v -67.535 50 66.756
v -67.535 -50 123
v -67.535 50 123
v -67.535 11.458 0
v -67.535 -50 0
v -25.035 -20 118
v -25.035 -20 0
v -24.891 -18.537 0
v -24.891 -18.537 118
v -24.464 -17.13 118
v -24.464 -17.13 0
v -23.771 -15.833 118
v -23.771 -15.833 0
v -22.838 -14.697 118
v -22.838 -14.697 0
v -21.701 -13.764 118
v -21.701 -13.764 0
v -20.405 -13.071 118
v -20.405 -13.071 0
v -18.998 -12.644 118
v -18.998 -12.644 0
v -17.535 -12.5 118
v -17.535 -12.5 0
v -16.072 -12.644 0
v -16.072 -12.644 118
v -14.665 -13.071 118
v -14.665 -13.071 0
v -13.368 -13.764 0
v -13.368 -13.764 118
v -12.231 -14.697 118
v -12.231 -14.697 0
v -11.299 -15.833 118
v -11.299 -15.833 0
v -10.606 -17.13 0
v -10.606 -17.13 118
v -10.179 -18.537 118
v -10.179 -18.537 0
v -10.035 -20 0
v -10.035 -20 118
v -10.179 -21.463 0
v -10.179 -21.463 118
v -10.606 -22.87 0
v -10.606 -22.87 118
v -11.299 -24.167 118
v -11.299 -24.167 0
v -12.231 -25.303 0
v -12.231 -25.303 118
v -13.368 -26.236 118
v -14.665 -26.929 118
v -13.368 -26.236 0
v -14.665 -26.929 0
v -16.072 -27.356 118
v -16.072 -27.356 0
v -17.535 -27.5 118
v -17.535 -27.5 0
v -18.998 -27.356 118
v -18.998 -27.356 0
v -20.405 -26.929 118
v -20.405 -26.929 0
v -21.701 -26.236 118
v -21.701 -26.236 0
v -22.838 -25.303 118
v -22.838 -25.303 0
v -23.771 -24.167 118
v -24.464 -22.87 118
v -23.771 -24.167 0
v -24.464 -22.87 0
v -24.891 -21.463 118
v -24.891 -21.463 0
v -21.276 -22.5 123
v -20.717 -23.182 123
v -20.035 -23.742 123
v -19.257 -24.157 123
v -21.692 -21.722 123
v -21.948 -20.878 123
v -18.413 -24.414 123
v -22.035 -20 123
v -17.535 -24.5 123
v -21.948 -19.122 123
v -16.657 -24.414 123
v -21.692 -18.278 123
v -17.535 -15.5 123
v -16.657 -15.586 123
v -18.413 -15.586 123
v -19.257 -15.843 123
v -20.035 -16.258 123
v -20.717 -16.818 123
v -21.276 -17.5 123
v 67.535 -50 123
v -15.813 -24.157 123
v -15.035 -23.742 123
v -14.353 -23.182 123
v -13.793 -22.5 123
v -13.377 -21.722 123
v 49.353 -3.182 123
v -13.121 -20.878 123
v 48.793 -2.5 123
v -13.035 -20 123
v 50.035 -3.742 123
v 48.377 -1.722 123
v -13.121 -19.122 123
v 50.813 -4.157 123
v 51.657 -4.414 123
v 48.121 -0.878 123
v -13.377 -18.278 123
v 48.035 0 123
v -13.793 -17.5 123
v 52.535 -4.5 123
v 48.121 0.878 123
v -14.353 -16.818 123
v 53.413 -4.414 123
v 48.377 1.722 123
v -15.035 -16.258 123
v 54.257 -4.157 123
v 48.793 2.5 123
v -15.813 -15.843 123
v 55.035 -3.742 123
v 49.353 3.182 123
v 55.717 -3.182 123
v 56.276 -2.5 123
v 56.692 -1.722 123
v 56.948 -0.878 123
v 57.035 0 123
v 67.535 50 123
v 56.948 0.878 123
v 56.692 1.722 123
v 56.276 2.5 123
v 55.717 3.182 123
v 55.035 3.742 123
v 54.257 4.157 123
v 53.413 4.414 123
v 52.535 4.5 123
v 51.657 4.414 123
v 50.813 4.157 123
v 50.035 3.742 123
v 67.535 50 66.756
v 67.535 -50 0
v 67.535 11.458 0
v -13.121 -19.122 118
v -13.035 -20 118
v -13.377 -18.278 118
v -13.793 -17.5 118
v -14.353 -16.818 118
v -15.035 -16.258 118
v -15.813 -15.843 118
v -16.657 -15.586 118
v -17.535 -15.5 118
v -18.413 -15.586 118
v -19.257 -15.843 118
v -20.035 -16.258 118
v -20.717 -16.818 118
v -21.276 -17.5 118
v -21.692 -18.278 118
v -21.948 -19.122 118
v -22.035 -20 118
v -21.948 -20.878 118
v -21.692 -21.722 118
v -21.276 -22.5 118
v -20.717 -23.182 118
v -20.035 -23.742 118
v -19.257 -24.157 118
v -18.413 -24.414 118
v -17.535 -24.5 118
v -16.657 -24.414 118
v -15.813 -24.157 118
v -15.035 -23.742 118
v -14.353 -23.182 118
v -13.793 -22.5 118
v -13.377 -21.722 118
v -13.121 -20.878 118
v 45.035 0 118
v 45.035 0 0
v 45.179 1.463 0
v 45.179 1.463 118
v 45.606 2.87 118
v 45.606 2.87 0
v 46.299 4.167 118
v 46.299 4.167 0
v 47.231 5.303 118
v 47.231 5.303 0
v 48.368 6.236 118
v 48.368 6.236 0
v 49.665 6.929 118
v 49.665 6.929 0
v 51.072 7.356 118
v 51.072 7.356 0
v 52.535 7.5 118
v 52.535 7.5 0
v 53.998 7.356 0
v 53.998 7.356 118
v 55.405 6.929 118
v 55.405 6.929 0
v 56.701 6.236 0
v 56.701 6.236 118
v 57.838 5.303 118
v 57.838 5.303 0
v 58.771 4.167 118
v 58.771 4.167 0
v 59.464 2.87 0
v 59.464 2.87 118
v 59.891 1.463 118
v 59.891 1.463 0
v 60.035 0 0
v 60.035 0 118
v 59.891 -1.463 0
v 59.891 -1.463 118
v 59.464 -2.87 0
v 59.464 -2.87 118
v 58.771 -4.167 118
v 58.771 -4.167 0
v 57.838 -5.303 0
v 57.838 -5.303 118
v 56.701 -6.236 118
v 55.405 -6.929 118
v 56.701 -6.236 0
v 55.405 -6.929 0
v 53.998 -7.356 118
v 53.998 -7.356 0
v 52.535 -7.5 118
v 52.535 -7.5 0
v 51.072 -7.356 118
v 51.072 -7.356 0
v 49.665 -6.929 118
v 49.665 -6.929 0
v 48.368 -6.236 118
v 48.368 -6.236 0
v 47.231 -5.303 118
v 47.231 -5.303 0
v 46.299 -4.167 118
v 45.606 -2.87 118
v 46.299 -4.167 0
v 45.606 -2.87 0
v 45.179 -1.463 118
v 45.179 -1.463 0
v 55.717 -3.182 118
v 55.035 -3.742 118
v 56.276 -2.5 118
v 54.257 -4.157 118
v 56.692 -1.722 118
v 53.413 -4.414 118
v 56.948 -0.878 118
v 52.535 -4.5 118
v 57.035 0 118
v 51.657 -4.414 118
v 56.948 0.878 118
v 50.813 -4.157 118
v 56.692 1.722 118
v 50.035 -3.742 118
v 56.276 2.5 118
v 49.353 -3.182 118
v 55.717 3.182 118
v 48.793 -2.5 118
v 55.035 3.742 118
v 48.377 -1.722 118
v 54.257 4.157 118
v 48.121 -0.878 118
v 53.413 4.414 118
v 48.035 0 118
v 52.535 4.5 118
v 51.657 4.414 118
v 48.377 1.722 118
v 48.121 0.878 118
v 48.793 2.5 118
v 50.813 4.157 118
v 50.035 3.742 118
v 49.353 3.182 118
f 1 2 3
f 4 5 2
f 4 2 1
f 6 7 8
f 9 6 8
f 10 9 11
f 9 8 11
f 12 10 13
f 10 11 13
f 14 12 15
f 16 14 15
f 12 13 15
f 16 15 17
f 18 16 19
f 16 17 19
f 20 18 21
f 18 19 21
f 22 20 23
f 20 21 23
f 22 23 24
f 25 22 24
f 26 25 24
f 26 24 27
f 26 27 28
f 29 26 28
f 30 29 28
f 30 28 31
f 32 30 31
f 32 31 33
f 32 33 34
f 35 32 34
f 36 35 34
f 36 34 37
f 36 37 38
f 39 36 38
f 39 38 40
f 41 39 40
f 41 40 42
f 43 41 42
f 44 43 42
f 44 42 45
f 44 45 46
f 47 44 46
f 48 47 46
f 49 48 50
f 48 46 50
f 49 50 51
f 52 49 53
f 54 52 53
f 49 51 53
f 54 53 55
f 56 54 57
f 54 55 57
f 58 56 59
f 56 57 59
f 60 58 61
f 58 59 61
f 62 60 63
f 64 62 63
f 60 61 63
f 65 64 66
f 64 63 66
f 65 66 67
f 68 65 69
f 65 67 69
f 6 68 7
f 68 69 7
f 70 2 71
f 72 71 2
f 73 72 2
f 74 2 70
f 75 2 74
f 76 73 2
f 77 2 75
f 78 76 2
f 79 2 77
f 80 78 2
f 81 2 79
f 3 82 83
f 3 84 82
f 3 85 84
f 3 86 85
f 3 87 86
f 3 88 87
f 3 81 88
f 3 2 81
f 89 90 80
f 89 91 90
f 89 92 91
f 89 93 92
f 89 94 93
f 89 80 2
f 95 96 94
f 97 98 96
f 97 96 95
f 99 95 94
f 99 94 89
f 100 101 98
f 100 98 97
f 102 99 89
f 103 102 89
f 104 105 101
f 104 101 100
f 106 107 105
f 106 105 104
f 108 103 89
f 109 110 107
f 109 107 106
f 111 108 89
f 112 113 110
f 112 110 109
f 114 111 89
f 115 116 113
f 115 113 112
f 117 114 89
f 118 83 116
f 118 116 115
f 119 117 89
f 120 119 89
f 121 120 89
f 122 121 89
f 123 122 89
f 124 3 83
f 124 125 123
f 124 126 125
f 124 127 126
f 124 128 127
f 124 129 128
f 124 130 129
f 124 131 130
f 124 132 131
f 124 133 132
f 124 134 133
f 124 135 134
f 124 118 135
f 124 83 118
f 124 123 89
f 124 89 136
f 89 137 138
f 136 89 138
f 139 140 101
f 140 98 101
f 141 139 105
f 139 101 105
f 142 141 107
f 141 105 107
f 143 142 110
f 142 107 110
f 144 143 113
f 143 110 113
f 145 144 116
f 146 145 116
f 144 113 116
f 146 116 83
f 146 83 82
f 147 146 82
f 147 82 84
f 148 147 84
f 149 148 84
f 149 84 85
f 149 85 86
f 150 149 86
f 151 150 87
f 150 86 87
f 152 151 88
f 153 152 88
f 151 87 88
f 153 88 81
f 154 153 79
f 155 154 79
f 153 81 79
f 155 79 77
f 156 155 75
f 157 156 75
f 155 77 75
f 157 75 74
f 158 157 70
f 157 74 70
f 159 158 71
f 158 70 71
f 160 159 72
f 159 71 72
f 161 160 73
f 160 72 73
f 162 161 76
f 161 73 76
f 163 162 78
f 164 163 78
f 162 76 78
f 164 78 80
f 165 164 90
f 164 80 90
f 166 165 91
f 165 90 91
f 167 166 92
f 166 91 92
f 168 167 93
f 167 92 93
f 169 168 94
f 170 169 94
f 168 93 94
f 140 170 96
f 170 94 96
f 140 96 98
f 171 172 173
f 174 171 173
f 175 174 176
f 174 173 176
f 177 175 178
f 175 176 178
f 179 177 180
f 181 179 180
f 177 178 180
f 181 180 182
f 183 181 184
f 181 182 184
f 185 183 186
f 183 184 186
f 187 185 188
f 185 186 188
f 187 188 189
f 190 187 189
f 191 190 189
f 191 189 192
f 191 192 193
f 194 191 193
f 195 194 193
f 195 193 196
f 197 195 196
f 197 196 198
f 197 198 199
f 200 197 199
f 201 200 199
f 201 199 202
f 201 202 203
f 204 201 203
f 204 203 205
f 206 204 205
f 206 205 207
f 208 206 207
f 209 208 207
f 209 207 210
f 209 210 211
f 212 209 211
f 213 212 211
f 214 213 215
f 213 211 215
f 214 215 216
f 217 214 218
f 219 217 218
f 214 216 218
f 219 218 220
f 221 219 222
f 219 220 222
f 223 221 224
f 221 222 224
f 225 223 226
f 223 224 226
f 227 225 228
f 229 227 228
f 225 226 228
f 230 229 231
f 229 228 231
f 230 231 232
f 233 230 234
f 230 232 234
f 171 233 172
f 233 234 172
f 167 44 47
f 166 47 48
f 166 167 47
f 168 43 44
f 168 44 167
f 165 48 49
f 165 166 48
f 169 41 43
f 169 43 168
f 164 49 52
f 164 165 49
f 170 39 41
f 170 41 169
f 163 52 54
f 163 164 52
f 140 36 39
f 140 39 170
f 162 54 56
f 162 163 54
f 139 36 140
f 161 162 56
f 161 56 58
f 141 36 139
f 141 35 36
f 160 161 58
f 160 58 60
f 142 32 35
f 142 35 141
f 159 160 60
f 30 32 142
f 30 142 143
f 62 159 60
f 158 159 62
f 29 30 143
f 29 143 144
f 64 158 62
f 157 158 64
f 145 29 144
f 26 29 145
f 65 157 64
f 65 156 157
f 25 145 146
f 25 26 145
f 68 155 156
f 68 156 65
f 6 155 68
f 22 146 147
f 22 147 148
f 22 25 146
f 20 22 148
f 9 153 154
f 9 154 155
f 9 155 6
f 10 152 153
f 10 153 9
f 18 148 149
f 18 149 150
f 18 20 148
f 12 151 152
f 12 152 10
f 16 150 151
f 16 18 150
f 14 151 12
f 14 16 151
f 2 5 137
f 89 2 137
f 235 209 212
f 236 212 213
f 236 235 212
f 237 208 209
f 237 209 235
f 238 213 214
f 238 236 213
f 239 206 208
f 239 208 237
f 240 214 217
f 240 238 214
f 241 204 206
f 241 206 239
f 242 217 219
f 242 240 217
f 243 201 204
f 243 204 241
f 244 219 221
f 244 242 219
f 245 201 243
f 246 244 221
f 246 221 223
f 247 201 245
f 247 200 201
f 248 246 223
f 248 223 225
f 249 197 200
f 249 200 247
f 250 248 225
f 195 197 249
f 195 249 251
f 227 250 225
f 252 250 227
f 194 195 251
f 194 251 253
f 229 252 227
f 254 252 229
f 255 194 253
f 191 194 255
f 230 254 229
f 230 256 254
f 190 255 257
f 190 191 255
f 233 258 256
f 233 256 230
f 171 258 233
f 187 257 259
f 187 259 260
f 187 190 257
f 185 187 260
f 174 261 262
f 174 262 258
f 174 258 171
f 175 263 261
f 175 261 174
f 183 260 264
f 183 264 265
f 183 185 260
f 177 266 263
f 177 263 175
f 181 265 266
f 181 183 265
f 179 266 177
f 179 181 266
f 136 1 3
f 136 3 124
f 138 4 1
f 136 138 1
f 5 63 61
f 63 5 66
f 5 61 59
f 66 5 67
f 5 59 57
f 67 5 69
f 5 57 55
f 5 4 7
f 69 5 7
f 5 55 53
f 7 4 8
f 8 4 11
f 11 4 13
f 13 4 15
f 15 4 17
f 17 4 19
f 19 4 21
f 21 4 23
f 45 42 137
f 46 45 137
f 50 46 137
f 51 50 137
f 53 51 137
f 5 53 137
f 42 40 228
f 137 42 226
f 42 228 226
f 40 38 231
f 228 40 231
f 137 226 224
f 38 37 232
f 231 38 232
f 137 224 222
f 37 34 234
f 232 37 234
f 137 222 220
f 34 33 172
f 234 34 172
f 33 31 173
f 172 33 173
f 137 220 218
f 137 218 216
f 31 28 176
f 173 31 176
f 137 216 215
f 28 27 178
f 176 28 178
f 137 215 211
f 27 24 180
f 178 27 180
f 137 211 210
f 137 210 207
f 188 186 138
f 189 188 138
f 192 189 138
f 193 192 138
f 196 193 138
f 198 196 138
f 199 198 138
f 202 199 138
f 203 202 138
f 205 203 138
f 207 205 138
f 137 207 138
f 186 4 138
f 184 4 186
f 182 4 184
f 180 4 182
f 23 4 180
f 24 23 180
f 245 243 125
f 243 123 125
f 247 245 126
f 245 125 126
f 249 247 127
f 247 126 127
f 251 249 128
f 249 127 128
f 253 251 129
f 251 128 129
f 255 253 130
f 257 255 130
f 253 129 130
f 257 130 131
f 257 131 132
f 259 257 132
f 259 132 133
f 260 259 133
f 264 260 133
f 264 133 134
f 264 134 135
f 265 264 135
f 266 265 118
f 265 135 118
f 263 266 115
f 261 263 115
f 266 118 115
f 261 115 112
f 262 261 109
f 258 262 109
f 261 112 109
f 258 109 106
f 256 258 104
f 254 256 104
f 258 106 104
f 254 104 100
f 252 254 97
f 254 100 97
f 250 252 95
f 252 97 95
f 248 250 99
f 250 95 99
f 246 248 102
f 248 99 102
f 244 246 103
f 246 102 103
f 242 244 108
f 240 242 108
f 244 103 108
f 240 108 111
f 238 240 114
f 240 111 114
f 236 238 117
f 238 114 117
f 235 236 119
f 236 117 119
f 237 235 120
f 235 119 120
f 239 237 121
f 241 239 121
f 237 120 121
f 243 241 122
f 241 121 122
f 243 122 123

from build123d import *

# Parameters (mm, degrees)
SKIZZE1_W                                           = 135.069444444
SKIZZE1_H                                           = 100
AUFSATZ_LINEAR_AUSTRAGEN1_DEPTH                     = 123
SCHNITT_LINEAR_AUSTRAGEN1_DEPTH                     = 190.401042295
STIRNSENKUNG_F_R_M8_SENKSCHRAUBE_KOPF_B_D           = 9
STIRNSENKUNG_F_R_M8_SENKSCHRAUBE_KOPF_B_CBORE_D     = 15
STIRNSENKUNG_F_R_M8_SENKSCHRAUBE_KOPF_B_CBORE_DEPTH = 118


with BuildPart() as part:
    # Skizze1 → Aufsatz-Linear austragen1 (new body)
    with BuildSketch(Plane.XY):
        Rectangle(SKIZZE1_W, SKIZZE1_H)
    extrude(amount=AUFSATZ_LINEAR_AUSTRAGEN1_DEPTH)

    # Skizze2 → Schnitt-Linear austragen1 (cut, through all)
    with BuildSketch(Plane.ZY.offset(67.534722222)):
        Polygon((0, 11.458333333), (66.756124875, 50), (0, 71.7778768), align=None)
    extrude(amount=-SCHNITT_LINEAR_AUSTRAGEN1_DEPTH, mode=Mode.SUBTRACT)

    # Stirnsenkung für M8 Senkschraube (Kopf Button)1 (through all)
    with Locations(Plane(origin=(0, 0, 0), x_dir=(-1, 0, 0), z_dir=(0, 0, -1))):
        with Locations((-52.534722222, 0), (17.534722222, -20)):
            CounterBoreHole(STIRNSENKUNG_F_R_M8_SENKSCHRAUBE_KOPF_B_D / 2, STIRNSENKUNG_F_R_M8_SENKSCHRAUBE_KOPF_B_CBORE_D / 2, STIRNSENKUNG_F_R_M8_SENKSCHRAUBE_KOPF_B_CBORE_DEPTH)


solid = part.part
